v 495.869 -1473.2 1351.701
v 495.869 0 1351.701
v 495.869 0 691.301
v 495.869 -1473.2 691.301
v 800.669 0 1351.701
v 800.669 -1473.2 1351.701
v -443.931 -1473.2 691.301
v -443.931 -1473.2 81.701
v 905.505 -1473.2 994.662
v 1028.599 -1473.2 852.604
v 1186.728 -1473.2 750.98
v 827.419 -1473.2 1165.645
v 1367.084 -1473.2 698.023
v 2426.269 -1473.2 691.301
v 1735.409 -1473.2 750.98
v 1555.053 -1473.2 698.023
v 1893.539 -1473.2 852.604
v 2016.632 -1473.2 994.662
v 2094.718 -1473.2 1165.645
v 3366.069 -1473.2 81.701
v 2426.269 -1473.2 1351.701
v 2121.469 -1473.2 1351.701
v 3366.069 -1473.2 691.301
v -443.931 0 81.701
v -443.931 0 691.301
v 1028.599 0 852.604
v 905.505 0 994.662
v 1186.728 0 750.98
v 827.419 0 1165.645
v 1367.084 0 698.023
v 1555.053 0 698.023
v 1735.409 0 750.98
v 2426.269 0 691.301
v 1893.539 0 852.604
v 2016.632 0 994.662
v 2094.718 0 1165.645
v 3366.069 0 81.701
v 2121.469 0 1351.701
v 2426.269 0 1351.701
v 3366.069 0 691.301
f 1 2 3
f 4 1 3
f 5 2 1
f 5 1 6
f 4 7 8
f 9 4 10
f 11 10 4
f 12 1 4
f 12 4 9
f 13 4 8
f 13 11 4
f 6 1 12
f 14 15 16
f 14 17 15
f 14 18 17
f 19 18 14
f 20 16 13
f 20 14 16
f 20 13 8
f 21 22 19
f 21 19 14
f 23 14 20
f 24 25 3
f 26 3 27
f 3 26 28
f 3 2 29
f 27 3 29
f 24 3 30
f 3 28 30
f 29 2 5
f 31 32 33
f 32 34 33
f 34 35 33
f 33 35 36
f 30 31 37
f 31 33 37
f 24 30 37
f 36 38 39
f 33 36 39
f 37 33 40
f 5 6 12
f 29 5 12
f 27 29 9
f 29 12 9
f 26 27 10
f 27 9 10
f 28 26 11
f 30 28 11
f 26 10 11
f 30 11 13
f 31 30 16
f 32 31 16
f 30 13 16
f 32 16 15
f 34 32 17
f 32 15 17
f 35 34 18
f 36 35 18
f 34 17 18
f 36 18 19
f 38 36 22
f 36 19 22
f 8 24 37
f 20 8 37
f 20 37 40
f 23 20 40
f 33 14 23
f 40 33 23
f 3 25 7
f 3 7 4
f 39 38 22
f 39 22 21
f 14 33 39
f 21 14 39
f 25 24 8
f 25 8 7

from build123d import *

# Parameters (mm, degrees)
F0_W     = 1930.4
F0_H     = 660.4
F0_H_2   = 609.6
F0_W_2   = 939.8
F1_DEPTH = 1473.2
F3_DEPTH = 1574.8


with BuildPart() as f1:
    # F0 (on Front) → F1 (new body)
    with BuildSketch(Plane.XZ):
        with Locations((1461.06854, 1021.501092)):
            Rectangle(F0_W, F0_H)
        with Locations((1461.06854, 386.501092)):
            Rectangle(F0_W, F0_H_2)
        with Locations((25.96854, 386.501092)):
            Rectangle(F0_W_2, F0_H_2)
        with Locations((2896.16854, 386.501092)):
            Rectangle(F0_W_2, F0_H_2)
    extrude(amount=F1_DEPTH)

    # F2 (on face) → F3 (cut)
    with BuildSketch(Plane.XZ.offset(1473.2)):
        with BuildLine():
            ThreePointArc((800.66854, 1351.701092), (1461.06854, 691.301092), (2121.46854, 1351.701092))
            Line((2121.46854, 1351.701092), (800.66854, 1351.701092))
        make_face()
    extrude(amount=-F3_DEPTH, mode=Mode.SUBTRACT)


solid = f1.part
